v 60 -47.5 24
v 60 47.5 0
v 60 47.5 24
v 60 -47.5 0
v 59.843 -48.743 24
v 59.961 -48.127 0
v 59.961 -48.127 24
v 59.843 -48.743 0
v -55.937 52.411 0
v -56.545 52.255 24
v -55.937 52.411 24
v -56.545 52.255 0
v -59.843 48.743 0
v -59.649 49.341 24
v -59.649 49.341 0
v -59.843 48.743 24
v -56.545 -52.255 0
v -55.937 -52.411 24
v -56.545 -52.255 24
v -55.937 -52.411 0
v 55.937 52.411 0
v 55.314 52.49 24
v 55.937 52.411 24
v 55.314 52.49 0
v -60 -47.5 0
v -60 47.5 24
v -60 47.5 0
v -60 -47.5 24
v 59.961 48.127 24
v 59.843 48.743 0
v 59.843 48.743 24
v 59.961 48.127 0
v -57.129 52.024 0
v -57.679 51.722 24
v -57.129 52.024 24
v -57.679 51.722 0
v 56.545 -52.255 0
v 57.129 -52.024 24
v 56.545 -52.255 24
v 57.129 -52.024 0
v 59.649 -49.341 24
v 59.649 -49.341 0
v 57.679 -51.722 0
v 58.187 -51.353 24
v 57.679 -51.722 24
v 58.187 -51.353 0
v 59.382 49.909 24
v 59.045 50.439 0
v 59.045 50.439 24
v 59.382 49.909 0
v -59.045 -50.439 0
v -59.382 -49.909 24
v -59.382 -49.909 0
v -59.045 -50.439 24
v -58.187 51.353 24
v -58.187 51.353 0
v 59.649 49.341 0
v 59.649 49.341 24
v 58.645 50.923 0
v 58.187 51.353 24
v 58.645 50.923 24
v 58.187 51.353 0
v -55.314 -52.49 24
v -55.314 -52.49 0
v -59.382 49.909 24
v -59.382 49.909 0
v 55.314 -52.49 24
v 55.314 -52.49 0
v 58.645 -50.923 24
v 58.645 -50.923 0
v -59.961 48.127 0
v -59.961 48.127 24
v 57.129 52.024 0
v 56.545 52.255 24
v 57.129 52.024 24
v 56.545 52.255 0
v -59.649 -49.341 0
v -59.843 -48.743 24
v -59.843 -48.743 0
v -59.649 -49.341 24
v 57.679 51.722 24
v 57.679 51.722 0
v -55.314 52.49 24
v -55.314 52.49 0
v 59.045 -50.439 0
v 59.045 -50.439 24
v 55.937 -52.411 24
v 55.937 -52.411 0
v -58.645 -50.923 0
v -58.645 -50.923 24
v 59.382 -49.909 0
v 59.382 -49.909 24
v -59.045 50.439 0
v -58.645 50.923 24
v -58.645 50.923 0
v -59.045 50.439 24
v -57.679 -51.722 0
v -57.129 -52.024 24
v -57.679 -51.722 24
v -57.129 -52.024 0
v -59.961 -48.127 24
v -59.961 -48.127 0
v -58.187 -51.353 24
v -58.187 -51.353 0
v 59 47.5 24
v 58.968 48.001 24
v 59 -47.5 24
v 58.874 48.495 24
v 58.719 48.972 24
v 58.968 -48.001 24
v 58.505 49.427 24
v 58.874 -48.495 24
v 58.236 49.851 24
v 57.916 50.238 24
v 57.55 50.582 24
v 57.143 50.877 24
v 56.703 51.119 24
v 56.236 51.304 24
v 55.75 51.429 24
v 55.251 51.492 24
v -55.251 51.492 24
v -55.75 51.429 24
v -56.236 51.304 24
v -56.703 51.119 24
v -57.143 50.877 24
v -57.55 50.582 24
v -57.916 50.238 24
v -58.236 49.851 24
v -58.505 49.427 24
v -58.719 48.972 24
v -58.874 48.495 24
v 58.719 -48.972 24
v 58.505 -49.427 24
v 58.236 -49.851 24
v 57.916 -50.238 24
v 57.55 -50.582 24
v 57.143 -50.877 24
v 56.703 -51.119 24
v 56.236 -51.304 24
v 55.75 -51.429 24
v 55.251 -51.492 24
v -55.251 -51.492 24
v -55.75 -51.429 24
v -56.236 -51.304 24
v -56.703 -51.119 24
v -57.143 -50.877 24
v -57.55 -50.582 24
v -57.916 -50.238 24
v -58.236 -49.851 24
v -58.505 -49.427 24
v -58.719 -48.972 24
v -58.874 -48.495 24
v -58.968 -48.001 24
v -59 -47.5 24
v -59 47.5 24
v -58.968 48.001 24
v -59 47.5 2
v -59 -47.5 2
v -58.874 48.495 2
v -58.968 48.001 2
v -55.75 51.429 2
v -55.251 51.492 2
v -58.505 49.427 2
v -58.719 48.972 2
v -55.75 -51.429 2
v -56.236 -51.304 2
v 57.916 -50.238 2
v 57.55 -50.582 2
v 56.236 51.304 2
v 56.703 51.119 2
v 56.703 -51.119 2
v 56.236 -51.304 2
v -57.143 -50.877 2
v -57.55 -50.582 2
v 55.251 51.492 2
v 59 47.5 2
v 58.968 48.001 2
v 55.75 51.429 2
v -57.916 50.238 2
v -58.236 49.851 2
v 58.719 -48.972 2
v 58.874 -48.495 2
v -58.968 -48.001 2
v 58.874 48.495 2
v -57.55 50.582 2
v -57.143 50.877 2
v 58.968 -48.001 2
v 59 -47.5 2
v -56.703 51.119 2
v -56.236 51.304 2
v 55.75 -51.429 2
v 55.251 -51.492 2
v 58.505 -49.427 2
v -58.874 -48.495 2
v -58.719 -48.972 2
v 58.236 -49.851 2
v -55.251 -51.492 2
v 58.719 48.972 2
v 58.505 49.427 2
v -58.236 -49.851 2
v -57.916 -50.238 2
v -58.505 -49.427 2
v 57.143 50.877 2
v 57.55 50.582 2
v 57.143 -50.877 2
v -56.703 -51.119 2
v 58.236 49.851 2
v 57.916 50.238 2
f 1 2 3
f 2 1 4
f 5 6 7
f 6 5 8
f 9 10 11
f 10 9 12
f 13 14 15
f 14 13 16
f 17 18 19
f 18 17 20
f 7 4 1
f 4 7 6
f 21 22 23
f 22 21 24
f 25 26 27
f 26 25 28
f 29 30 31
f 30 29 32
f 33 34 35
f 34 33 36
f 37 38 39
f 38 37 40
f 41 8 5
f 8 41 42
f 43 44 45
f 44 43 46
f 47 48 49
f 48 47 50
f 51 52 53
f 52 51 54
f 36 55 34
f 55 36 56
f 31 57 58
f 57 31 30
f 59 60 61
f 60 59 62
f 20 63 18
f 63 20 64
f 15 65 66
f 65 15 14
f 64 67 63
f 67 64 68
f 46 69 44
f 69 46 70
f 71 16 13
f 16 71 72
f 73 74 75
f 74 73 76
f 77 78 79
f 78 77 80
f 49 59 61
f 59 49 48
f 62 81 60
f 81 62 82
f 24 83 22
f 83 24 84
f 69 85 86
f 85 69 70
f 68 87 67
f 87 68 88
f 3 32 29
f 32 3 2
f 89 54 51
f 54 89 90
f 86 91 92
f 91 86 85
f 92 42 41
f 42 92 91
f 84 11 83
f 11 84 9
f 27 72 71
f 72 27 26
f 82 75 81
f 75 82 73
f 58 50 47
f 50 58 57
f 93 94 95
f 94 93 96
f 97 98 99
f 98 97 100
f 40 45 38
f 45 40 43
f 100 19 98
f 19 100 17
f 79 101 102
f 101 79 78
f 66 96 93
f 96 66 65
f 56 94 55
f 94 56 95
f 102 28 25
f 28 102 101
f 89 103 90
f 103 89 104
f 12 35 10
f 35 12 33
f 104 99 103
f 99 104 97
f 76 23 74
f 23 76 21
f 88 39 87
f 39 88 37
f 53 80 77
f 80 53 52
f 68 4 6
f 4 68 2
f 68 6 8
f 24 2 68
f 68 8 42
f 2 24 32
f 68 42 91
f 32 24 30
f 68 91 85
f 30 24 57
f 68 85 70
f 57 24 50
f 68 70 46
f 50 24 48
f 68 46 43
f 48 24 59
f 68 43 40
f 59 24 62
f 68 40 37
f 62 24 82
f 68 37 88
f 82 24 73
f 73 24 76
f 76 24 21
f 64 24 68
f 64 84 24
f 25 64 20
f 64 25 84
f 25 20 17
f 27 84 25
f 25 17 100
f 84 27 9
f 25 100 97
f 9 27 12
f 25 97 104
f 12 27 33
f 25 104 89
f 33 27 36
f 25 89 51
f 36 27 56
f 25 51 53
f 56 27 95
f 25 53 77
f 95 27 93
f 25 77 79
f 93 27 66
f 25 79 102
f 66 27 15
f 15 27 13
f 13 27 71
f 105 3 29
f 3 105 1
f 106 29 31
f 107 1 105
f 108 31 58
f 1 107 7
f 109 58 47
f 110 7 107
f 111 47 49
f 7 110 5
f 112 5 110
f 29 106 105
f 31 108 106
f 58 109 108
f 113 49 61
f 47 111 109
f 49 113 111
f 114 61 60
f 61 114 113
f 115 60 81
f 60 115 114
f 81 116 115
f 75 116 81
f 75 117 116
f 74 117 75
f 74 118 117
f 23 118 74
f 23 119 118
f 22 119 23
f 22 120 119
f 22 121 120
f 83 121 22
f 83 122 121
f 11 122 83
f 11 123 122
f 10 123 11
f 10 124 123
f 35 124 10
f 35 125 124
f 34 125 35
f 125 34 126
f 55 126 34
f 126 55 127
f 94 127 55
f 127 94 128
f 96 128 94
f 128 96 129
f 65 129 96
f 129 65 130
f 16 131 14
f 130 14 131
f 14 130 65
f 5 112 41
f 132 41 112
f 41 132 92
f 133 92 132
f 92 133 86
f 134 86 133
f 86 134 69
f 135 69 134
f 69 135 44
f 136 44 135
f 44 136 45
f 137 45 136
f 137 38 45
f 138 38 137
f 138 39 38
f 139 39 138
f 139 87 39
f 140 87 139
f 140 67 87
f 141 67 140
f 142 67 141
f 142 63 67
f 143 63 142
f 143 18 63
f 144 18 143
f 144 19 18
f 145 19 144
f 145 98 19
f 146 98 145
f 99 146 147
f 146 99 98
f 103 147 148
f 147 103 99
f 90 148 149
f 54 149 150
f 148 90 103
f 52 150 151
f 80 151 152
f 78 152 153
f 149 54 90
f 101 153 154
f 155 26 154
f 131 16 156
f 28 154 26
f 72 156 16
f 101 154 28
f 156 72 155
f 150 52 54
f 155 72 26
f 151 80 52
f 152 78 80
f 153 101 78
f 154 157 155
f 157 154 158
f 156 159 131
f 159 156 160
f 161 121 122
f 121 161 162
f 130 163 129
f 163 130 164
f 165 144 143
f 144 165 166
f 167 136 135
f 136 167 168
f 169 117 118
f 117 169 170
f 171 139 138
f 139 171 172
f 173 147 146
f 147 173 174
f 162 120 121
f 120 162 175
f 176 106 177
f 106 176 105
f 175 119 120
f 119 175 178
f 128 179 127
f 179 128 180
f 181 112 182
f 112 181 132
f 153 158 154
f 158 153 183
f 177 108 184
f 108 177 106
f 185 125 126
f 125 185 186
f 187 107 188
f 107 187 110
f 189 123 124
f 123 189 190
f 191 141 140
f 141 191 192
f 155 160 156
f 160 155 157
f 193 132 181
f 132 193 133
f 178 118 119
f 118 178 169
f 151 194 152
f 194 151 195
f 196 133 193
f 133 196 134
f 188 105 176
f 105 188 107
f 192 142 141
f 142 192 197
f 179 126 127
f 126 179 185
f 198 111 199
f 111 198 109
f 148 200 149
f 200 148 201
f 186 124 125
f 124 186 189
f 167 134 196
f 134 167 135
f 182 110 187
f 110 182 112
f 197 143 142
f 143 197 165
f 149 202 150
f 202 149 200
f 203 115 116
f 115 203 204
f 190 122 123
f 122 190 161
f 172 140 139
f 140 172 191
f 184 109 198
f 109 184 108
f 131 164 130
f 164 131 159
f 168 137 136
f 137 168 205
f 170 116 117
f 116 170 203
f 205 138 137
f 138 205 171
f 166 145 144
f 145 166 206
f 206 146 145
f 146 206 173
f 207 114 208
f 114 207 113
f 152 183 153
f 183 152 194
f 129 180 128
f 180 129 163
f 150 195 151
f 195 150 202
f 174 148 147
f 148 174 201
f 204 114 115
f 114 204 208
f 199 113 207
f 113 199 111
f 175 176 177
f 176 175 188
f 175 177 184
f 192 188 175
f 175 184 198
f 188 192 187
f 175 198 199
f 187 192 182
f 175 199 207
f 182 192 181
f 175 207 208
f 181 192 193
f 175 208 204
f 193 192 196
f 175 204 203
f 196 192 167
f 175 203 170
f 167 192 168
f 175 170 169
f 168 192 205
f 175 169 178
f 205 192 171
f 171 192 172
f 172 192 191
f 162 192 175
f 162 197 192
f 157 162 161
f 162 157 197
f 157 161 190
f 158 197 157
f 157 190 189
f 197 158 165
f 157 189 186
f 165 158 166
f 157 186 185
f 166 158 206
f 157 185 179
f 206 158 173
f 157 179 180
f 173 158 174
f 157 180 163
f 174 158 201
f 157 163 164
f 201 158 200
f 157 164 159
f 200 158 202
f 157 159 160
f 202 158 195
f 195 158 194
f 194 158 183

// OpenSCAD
$fn = 50;


difference() {
	union() {
		hull() {
			translate(v = [-55.0000000000, 47.5000000000, 0]) {
				cylinder(h = 24, r = 5);
			}
			translate(v = [55.0000000000, 47.5000000000, 0]) {
				cylinder(h = 24, r = 5);
			}
			translate(v = [-55.0000000000, -47.5000000000, 0]) {
				cylinder(h = 24, r = 5);
			}
			translate(v = [55.0000000000, -47.5000000000, 0]) {
				cylinder(h = 24, r = 5);
			}
		}
	}
	union() {
		translate(v = [0, 0, 2]) {
			hull() {
				translate(v = [-55.0000000000, 47.5000000000, 0]) {
					cylinder(h = 22, r = 4);
				}
				translate(v = [55.0000000000, 47.5000000000, 0]) {
					cylinder(h = 22, r = 4);
				}
				translate(v = [-55.0000000000, -47.5000000000, 0]) {
					cylinder(h = 22, r = 4);
				}
				translate(v = [55.0000000000, -47.5000000000, 0]) {
					cylinder(h = 22, r = 4);
				}
			}
		}
	}
}
